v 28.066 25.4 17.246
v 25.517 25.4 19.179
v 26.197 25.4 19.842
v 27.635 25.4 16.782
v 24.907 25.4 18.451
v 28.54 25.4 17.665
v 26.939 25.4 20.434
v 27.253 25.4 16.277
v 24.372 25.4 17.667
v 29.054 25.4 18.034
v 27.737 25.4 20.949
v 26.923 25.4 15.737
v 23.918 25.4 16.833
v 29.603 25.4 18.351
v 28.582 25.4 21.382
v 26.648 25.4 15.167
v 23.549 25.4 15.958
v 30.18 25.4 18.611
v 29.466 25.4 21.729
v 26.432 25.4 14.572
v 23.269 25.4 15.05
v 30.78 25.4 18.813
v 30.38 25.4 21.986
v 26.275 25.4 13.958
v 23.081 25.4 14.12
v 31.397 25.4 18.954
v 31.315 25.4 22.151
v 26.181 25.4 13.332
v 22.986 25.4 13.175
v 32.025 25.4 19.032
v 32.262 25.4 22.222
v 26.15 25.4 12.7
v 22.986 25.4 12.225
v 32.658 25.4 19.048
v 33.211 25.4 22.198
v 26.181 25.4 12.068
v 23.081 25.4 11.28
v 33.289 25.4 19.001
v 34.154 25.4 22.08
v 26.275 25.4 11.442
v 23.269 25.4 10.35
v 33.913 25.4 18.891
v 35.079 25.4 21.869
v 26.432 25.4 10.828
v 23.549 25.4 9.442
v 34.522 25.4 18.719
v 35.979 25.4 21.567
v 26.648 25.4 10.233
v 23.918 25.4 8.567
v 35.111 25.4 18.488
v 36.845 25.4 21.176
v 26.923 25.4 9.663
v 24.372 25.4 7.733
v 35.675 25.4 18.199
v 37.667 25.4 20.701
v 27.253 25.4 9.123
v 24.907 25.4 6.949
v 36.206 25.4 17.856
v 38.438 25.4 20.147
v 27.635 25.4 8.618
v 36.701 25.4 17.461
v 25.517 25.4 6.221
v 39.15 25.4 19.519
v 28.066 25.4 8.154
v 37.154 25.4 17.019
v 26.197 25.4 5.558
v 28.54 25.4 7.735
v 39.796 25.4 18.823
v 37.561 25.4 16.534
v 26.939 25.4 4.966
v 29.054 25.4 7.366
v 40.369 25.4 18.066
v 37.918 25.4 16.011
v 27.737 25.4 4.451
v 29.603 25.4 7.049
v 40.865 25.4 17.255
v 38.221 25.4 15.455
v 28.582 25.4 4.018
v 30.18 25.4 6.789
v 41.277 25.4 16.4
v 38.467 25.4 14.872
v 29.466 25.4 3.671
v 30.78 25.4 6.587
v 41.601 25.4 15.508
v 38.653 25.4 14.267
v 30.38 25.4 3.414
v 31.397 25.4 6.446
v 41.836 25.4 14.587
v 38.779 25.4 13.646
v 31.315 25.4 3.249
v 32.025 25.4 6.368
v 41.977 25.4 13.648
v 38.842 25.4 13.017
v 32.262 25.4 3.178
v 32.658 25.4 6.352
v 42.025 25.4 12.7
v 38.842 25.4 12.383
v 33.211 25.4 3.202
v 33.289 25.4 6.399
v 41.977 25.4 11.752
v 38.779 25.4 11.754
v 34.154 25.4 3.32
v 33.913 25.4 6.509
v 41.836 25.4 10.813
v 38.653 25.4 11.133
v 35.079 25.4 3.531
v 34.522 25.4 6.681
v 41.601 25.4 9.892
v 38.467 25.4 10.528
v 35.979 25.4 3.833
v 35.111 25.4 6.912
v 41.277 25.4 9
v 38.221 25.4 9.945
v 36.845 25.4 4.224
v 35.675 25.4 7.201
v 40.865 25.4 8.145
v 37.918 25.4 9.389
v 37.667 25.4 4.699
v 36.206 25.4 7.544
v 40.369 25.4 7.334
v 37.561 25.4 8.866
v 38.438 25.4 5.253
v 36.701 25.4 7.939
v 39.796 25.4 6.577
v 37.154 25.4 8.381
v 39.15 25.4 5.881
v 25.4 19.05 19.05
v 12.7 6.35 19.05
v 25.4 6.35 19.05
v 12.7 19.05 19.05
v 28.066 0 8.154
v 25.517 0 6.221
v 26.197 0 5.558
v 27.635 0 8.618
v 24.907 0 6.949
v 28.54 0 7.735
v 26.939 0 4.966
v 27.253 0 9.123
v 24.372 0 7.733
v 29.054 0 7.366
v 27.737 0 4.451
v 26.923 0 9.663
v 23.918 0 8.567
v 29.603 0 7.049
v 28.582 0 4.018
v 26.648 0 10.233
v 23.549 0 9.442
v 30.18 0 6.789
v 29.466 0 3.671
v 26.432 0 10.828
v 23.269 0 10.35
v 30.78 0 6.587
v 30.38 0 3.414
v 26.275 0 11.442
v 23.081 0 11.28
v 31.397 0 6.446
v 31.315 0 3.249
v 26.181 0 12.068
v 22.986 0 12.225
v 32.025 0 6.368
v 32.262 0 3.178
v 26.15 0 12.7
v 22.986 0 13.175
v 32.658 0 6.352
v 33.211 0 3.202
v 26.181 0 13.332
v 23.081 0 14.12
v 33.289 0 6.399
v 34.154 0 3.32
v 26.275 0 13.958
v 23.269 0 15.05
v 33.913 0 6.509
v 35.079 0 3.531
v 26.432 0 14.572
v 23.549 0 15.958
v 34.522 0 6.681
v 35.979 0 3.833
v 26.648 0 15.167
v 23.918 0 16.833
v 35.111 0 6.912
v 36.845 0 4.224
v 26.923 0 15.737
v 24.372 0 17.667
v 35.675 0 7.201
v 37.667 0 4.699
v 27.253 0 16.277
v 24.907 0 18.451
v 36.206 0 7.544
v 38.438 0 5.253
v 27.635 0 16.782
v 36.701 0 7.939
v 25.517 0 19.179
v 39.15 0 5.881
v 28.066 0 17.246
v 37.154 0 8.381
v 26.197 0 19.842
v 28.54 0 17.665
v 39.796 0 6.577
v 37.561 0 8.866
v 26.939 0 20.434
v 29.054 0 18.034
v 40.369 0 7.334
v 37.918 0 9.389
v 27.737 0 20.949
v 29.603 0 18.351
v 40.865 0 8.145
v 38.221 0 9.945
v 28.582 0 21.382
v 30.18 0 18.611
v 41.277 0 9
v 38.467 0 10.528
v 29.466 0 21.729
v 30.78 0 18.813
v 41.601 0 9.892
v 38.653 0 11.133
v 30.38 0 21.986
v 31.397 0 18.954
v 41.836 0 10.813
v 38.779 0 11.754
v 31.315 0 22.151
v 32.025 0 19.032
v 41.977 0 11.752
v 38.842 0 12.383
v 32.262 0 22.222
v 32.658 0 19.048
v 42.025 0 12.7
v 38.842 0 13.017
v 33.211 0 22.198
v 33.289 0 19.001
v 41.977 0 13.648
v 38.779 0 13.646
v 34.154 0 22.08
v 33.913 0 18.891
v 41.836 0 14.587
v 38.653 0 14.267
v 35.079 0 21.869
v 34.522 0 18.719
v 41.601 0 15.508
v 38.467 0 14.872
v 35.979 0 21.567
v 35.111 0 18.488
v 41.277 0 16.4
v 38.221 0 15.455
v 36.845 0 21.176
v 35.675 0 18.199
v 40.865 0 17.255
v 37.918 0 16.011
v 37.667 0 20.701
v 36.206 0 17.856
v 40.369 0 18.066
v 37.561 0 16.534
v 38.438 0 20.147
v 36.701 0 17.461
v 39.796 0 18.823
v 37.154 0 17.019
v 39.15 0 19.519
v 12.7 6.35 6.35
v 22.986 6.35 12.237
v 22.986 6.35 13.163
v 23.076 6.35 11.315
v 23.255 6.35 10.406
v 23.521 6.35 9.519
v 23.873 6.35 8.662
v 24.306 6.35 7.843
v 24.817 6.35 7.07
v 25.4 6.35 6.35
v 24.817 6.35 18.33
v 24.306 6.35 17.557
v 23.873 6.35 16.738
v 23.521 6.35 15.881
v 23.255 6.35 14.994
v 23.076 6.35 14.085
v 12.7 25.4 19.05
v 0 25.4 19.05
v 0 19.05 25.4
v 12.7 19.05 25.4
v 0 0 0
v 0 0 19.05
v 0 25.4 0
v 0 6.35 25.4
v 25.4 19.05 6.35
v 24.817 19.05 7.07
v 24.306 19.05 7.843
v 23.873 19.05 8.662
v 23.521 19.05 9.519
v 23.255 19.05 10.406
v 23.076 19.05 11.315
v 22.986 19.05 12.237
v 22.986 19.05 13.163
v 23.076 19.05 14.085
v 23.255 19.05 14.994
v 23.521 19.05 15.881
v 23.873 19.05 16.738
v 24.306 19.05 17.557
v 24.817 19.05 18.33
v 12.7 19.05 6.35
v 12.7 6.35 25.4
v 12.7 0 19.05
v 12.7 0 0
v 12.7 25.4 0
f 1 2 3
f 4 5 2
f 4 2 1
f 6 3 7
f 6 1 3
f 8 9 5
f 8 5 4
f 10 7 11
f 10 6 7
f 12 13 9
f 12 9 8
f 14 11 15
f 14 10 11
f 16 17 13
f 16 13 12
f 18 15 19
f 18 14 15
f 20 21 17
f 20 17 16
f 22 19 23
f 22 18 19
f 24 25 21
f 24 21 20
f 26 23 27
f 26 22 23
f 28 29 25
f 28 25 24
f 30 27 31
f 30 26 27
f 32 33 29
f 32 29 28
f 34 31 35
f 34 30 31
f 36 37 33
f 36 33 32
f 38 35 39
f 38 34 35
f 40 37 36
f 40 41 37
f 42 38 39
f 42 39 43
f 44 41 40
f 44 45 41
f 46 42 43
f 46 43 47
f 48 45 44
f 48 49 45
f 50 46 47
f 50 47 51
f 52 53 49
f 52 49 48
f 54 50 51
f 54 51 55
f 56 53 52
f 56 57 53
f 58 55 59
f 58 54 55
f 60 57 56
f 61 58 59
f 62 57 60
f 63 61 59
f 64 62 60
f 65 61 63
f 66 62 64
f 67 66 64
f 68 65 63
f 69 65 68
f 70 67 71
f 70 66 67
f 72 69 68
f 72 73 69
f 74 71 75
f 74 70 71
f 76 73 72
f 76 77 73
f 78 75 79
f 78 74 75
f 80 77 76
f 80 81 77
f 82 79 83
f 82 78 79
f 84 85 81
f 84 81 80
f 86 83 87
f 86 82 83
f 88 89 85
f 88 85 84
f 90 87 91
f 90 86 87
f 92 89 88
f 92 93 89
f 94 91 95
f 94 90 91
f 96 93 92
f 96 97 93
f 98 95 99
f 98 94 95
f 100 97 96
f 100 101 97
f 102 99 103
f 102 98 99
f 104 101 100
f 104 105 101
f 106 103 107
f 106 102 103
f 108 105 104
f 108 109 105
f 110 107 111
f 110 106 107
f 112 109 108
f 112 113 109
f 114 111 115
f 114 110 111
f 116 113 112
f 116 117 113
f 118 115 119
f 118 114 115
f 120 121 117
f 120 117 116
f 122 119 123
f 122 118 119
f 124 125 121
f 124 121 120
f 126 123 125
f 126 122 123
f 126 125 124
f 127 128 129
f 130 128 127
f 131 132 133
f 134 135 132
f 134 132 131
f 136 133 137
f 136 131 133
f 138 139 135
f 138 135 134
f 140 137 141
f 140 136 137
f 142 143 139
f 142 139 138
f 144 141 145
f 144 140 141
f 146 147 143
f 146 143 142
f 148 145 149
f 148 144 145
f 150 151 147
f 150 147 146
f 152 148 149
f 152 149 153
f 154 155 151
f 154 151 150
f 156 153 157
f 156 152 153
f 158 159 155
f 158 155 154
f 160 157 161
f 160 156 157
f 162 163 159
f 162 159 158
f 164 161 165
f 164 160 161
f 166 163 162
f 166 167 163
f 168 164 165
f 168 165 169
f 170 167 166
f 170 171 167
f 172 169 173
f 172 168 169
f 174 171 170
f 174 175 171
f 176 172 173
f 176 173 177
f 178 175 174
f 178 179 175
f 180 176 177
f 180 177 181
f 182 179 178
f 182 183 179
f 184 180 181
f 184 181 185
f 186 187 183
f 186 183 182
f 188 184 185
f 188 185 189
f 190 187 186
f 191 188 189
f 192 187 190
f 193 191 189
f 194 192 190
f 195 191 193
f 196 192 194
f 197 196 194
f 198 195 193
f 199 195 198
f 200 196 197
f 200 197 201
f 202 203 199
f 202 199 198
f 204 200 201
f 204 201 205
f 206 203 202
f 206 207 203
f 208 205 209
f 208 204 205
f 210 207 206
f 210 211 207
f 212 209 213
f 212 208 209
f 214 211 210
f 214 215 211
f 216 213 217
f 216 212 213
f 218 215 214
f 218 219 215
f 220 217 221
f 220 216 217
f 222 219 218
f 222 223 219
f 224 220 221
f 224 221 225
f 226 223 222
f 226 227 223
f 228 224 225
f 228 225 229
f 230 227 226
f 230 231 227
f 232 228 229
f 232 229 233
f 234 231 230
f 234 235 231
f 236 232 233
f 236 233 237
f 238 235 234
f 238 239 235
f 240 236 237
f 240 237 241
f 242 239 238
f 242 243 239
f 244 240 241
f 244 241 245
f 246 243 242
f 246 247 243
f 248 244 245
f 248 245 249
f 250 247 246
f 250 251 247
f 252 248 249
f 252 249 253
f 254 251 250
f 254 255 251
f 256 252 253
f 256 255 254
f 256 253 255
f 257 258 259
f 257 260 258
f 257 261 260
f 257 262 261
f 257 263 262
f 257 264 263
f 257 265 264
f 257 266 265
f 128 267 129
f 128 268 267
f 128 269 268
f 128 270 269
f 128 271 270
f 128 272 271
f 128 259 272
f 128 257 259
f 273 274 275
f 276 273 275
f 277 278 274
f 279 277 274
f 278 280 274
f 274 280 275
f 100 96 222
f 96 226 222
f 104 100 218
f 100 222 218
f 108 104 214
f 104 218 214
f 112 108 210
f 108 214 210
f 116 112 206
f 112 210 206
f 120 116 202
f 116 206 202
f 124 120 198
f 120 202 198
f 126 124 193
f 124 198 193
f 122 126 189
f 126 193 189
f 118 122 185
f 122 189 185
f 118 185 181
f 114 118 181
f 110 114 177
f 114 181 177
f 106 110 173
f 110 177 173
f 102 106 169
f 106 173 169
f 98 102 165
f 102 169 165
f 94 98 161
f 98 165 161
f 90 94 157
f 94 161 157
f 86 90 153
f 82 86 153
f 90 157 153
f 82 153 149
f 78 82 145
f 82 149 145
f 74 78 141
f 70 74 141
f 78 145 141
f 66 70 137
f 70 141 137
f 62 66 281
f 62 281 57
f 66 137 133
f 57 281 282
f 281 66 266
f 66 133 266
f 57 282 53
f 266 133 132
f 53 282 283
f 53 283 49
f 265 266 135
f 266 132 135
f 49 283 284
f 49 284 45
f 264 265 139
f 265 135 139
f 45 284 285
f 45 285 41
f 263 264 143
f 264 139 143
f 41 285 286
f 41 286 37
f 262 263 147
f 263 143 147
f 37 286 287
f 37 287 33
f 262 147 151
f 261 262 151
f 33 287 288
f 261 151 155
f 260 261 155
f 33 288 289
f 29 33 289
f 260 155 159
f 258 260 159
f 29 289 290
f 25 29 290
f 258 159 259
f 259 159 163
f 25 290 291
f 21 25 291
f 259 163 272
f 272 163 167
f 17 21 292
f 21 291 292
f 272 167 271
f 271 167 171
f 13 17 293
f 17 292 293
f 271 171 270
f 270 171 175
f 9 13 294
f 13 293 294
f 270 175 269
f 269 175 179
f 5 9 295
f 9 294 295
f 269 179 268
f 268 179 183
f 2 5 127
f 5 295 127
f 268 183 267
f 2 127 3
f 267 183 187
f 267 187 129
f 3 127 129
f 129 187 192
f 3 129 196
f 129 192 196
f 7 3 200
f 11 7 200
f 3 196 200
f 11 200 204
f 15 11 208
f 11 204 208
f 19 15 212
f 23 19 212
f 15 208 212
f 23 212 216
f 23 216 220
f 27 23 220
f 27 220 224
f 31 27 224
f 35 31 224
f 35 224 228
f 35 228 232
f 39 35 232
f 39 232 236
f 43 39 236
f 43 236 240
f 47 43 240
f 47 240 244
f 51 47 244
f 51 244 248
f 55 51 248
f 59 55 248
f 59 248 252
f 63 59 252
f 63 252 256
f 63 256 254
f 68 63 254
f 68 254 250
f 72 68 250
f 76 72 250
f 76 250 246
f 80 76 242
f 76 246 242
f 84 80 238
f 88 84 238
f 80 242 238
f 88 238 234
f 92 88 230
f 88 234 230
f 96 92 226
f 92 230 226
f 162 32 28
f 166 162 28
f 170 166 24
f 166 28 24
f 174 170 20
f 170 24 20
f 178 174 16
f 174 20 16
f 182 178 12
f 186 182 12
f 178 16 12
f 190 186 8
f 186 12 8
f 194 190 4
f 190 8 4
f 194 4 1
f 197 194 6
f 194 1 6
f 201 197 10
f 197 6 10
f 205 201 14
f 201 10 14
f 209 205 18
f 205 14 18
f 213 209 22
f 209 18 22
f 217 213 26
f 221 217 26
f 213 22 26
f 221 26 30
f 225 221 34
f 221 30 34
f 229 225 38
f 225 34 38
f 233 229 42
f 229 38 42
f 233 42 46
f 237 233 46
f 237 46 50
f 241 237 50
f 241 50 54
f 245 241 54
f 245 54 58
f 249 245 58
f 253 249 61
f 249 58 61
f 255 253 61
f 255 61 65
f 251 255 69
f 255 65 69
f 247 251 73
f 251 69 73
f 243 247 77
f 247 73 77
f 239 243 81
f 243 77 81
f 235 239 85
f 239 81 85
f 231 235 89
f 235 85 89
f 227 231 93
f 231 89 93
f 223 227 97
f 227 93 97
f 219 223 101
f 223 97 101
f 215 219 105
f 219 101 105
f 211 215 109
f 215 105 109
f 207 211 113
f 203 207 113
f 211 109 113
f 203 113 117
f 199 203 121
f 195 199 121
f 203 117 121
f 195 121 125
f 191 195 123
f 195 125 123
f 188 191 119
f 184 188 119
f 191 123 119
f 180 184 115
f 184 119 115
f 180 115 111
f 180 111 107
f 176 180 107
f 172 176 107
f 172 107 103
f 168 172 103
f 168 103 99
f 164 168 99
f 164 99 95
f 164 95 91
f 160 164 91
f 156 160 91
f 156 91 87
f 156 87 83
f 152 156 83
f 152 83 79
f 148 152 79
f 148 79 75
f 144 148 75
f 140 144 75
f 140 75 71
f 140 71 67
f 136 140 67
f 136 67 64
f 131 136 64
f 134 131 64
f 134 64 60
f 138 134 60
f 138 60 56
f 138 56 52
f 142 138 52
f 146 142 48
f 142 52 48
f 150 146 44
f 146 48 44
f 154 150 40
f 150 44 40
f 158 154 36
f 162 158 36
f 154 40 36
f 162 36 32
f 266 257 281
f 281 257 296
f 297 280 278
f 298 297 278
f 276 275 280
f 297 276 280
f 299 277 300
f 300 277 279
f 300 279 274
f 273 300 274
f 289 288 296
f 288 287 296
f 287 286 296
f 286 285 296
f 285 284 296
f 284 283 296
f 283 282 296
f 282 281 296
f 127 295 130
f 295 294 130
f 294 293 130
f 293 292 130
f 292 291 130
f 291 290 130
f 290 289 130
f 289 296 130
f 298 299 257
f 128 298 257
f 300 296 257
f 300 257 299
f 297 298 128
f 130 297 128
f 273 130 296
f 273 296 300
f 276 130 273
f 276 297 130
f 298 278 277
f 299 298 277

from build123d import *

# Parameters (mm, degrees)
F1_DEPTH  = 12.7
F2_W      = 12.7
F2_H      = 12.7
F3_DEPTH  = 25.4
F5_DEPTH  = 12.7
F6_R      = 9.525
F7_DEPTH  = 6.35
F7_FACE_R = 9.525
F8_DEPTH  = 19.05
F9_R      = 6.35
F10_DEPTH = 25.4


with BuildPart() as f1:
    # F0 (on Right) → F1 (new body)
    with BuildSketch(Plane.YZ):
        Polygon((0, 19.05), (0, 0), (25.4, 0), (25.4, 19.05), (19.05, 25.4), (6.35, 25.4), align=None)
    extrude(amount=F1_DEPTH)

    # F2 (on face) → F3 (join)
    with BuildSketch(Plane.YZ.offset(12.7)):
        with Locations((12.7, 12.7)):
            Rectangle(F2_W, F2_H)
    extrude(amount=F3_DEPTH)

    # F4 (on face) → F5 (cut)
    with BuildSketch(Plane.XZ.offset(-6.35)):
        with BuildLine():
            Line((38.1, 6.35), (38.1, 19.05))
            Line((38.1, 19.05), (25.4, 19.05))
            ThreePointArc((25.4, 19.05), (22.974516, 12.7), (25.4, 6.35))
            Line((25.4, 6.35), (38.1, 6.35))
        make_face()
    extrude(amount=-F5_DEPTH, mode=Mode.SUBTRACT)



with BuildPart() as f7:
    # F6 (on face) → F7 (new body)
    with BuildSketch(Plane.XZ.offset(-6.35)):
        with Locations((32.499516, 12.7)):
            Circle(F6_R)
    extrude(amount=F7_DEPTH)


with BuildPart() as f1_1:
    add(f1.part)

    add(f7.part)  # F8 merges F7
    # F7_face (on face) → F8 (join)
    with BuildSketch(Plane(origin=(32.499516, 6.35, 12.7), x_dir=(1, 0, 0), z_dir=(0, 1, 0))):
        Circle(F7_FACE_R)
    extrude(amount=F8_DEPTH)

    # F9 (on face) → F10 (cut)
    with BuildSketch(Plane(origin=(0, 25.4, 0), x_dir=(-1, 0, 0), z_dir=(0, 1, 0))):
        with Locations((-32.499516, 12.7)):
            Circle(F9_R)
    extrude(amount=-F10_DEPTH, mode=Mode.SUBTRACT)


solid = f1_1.part
